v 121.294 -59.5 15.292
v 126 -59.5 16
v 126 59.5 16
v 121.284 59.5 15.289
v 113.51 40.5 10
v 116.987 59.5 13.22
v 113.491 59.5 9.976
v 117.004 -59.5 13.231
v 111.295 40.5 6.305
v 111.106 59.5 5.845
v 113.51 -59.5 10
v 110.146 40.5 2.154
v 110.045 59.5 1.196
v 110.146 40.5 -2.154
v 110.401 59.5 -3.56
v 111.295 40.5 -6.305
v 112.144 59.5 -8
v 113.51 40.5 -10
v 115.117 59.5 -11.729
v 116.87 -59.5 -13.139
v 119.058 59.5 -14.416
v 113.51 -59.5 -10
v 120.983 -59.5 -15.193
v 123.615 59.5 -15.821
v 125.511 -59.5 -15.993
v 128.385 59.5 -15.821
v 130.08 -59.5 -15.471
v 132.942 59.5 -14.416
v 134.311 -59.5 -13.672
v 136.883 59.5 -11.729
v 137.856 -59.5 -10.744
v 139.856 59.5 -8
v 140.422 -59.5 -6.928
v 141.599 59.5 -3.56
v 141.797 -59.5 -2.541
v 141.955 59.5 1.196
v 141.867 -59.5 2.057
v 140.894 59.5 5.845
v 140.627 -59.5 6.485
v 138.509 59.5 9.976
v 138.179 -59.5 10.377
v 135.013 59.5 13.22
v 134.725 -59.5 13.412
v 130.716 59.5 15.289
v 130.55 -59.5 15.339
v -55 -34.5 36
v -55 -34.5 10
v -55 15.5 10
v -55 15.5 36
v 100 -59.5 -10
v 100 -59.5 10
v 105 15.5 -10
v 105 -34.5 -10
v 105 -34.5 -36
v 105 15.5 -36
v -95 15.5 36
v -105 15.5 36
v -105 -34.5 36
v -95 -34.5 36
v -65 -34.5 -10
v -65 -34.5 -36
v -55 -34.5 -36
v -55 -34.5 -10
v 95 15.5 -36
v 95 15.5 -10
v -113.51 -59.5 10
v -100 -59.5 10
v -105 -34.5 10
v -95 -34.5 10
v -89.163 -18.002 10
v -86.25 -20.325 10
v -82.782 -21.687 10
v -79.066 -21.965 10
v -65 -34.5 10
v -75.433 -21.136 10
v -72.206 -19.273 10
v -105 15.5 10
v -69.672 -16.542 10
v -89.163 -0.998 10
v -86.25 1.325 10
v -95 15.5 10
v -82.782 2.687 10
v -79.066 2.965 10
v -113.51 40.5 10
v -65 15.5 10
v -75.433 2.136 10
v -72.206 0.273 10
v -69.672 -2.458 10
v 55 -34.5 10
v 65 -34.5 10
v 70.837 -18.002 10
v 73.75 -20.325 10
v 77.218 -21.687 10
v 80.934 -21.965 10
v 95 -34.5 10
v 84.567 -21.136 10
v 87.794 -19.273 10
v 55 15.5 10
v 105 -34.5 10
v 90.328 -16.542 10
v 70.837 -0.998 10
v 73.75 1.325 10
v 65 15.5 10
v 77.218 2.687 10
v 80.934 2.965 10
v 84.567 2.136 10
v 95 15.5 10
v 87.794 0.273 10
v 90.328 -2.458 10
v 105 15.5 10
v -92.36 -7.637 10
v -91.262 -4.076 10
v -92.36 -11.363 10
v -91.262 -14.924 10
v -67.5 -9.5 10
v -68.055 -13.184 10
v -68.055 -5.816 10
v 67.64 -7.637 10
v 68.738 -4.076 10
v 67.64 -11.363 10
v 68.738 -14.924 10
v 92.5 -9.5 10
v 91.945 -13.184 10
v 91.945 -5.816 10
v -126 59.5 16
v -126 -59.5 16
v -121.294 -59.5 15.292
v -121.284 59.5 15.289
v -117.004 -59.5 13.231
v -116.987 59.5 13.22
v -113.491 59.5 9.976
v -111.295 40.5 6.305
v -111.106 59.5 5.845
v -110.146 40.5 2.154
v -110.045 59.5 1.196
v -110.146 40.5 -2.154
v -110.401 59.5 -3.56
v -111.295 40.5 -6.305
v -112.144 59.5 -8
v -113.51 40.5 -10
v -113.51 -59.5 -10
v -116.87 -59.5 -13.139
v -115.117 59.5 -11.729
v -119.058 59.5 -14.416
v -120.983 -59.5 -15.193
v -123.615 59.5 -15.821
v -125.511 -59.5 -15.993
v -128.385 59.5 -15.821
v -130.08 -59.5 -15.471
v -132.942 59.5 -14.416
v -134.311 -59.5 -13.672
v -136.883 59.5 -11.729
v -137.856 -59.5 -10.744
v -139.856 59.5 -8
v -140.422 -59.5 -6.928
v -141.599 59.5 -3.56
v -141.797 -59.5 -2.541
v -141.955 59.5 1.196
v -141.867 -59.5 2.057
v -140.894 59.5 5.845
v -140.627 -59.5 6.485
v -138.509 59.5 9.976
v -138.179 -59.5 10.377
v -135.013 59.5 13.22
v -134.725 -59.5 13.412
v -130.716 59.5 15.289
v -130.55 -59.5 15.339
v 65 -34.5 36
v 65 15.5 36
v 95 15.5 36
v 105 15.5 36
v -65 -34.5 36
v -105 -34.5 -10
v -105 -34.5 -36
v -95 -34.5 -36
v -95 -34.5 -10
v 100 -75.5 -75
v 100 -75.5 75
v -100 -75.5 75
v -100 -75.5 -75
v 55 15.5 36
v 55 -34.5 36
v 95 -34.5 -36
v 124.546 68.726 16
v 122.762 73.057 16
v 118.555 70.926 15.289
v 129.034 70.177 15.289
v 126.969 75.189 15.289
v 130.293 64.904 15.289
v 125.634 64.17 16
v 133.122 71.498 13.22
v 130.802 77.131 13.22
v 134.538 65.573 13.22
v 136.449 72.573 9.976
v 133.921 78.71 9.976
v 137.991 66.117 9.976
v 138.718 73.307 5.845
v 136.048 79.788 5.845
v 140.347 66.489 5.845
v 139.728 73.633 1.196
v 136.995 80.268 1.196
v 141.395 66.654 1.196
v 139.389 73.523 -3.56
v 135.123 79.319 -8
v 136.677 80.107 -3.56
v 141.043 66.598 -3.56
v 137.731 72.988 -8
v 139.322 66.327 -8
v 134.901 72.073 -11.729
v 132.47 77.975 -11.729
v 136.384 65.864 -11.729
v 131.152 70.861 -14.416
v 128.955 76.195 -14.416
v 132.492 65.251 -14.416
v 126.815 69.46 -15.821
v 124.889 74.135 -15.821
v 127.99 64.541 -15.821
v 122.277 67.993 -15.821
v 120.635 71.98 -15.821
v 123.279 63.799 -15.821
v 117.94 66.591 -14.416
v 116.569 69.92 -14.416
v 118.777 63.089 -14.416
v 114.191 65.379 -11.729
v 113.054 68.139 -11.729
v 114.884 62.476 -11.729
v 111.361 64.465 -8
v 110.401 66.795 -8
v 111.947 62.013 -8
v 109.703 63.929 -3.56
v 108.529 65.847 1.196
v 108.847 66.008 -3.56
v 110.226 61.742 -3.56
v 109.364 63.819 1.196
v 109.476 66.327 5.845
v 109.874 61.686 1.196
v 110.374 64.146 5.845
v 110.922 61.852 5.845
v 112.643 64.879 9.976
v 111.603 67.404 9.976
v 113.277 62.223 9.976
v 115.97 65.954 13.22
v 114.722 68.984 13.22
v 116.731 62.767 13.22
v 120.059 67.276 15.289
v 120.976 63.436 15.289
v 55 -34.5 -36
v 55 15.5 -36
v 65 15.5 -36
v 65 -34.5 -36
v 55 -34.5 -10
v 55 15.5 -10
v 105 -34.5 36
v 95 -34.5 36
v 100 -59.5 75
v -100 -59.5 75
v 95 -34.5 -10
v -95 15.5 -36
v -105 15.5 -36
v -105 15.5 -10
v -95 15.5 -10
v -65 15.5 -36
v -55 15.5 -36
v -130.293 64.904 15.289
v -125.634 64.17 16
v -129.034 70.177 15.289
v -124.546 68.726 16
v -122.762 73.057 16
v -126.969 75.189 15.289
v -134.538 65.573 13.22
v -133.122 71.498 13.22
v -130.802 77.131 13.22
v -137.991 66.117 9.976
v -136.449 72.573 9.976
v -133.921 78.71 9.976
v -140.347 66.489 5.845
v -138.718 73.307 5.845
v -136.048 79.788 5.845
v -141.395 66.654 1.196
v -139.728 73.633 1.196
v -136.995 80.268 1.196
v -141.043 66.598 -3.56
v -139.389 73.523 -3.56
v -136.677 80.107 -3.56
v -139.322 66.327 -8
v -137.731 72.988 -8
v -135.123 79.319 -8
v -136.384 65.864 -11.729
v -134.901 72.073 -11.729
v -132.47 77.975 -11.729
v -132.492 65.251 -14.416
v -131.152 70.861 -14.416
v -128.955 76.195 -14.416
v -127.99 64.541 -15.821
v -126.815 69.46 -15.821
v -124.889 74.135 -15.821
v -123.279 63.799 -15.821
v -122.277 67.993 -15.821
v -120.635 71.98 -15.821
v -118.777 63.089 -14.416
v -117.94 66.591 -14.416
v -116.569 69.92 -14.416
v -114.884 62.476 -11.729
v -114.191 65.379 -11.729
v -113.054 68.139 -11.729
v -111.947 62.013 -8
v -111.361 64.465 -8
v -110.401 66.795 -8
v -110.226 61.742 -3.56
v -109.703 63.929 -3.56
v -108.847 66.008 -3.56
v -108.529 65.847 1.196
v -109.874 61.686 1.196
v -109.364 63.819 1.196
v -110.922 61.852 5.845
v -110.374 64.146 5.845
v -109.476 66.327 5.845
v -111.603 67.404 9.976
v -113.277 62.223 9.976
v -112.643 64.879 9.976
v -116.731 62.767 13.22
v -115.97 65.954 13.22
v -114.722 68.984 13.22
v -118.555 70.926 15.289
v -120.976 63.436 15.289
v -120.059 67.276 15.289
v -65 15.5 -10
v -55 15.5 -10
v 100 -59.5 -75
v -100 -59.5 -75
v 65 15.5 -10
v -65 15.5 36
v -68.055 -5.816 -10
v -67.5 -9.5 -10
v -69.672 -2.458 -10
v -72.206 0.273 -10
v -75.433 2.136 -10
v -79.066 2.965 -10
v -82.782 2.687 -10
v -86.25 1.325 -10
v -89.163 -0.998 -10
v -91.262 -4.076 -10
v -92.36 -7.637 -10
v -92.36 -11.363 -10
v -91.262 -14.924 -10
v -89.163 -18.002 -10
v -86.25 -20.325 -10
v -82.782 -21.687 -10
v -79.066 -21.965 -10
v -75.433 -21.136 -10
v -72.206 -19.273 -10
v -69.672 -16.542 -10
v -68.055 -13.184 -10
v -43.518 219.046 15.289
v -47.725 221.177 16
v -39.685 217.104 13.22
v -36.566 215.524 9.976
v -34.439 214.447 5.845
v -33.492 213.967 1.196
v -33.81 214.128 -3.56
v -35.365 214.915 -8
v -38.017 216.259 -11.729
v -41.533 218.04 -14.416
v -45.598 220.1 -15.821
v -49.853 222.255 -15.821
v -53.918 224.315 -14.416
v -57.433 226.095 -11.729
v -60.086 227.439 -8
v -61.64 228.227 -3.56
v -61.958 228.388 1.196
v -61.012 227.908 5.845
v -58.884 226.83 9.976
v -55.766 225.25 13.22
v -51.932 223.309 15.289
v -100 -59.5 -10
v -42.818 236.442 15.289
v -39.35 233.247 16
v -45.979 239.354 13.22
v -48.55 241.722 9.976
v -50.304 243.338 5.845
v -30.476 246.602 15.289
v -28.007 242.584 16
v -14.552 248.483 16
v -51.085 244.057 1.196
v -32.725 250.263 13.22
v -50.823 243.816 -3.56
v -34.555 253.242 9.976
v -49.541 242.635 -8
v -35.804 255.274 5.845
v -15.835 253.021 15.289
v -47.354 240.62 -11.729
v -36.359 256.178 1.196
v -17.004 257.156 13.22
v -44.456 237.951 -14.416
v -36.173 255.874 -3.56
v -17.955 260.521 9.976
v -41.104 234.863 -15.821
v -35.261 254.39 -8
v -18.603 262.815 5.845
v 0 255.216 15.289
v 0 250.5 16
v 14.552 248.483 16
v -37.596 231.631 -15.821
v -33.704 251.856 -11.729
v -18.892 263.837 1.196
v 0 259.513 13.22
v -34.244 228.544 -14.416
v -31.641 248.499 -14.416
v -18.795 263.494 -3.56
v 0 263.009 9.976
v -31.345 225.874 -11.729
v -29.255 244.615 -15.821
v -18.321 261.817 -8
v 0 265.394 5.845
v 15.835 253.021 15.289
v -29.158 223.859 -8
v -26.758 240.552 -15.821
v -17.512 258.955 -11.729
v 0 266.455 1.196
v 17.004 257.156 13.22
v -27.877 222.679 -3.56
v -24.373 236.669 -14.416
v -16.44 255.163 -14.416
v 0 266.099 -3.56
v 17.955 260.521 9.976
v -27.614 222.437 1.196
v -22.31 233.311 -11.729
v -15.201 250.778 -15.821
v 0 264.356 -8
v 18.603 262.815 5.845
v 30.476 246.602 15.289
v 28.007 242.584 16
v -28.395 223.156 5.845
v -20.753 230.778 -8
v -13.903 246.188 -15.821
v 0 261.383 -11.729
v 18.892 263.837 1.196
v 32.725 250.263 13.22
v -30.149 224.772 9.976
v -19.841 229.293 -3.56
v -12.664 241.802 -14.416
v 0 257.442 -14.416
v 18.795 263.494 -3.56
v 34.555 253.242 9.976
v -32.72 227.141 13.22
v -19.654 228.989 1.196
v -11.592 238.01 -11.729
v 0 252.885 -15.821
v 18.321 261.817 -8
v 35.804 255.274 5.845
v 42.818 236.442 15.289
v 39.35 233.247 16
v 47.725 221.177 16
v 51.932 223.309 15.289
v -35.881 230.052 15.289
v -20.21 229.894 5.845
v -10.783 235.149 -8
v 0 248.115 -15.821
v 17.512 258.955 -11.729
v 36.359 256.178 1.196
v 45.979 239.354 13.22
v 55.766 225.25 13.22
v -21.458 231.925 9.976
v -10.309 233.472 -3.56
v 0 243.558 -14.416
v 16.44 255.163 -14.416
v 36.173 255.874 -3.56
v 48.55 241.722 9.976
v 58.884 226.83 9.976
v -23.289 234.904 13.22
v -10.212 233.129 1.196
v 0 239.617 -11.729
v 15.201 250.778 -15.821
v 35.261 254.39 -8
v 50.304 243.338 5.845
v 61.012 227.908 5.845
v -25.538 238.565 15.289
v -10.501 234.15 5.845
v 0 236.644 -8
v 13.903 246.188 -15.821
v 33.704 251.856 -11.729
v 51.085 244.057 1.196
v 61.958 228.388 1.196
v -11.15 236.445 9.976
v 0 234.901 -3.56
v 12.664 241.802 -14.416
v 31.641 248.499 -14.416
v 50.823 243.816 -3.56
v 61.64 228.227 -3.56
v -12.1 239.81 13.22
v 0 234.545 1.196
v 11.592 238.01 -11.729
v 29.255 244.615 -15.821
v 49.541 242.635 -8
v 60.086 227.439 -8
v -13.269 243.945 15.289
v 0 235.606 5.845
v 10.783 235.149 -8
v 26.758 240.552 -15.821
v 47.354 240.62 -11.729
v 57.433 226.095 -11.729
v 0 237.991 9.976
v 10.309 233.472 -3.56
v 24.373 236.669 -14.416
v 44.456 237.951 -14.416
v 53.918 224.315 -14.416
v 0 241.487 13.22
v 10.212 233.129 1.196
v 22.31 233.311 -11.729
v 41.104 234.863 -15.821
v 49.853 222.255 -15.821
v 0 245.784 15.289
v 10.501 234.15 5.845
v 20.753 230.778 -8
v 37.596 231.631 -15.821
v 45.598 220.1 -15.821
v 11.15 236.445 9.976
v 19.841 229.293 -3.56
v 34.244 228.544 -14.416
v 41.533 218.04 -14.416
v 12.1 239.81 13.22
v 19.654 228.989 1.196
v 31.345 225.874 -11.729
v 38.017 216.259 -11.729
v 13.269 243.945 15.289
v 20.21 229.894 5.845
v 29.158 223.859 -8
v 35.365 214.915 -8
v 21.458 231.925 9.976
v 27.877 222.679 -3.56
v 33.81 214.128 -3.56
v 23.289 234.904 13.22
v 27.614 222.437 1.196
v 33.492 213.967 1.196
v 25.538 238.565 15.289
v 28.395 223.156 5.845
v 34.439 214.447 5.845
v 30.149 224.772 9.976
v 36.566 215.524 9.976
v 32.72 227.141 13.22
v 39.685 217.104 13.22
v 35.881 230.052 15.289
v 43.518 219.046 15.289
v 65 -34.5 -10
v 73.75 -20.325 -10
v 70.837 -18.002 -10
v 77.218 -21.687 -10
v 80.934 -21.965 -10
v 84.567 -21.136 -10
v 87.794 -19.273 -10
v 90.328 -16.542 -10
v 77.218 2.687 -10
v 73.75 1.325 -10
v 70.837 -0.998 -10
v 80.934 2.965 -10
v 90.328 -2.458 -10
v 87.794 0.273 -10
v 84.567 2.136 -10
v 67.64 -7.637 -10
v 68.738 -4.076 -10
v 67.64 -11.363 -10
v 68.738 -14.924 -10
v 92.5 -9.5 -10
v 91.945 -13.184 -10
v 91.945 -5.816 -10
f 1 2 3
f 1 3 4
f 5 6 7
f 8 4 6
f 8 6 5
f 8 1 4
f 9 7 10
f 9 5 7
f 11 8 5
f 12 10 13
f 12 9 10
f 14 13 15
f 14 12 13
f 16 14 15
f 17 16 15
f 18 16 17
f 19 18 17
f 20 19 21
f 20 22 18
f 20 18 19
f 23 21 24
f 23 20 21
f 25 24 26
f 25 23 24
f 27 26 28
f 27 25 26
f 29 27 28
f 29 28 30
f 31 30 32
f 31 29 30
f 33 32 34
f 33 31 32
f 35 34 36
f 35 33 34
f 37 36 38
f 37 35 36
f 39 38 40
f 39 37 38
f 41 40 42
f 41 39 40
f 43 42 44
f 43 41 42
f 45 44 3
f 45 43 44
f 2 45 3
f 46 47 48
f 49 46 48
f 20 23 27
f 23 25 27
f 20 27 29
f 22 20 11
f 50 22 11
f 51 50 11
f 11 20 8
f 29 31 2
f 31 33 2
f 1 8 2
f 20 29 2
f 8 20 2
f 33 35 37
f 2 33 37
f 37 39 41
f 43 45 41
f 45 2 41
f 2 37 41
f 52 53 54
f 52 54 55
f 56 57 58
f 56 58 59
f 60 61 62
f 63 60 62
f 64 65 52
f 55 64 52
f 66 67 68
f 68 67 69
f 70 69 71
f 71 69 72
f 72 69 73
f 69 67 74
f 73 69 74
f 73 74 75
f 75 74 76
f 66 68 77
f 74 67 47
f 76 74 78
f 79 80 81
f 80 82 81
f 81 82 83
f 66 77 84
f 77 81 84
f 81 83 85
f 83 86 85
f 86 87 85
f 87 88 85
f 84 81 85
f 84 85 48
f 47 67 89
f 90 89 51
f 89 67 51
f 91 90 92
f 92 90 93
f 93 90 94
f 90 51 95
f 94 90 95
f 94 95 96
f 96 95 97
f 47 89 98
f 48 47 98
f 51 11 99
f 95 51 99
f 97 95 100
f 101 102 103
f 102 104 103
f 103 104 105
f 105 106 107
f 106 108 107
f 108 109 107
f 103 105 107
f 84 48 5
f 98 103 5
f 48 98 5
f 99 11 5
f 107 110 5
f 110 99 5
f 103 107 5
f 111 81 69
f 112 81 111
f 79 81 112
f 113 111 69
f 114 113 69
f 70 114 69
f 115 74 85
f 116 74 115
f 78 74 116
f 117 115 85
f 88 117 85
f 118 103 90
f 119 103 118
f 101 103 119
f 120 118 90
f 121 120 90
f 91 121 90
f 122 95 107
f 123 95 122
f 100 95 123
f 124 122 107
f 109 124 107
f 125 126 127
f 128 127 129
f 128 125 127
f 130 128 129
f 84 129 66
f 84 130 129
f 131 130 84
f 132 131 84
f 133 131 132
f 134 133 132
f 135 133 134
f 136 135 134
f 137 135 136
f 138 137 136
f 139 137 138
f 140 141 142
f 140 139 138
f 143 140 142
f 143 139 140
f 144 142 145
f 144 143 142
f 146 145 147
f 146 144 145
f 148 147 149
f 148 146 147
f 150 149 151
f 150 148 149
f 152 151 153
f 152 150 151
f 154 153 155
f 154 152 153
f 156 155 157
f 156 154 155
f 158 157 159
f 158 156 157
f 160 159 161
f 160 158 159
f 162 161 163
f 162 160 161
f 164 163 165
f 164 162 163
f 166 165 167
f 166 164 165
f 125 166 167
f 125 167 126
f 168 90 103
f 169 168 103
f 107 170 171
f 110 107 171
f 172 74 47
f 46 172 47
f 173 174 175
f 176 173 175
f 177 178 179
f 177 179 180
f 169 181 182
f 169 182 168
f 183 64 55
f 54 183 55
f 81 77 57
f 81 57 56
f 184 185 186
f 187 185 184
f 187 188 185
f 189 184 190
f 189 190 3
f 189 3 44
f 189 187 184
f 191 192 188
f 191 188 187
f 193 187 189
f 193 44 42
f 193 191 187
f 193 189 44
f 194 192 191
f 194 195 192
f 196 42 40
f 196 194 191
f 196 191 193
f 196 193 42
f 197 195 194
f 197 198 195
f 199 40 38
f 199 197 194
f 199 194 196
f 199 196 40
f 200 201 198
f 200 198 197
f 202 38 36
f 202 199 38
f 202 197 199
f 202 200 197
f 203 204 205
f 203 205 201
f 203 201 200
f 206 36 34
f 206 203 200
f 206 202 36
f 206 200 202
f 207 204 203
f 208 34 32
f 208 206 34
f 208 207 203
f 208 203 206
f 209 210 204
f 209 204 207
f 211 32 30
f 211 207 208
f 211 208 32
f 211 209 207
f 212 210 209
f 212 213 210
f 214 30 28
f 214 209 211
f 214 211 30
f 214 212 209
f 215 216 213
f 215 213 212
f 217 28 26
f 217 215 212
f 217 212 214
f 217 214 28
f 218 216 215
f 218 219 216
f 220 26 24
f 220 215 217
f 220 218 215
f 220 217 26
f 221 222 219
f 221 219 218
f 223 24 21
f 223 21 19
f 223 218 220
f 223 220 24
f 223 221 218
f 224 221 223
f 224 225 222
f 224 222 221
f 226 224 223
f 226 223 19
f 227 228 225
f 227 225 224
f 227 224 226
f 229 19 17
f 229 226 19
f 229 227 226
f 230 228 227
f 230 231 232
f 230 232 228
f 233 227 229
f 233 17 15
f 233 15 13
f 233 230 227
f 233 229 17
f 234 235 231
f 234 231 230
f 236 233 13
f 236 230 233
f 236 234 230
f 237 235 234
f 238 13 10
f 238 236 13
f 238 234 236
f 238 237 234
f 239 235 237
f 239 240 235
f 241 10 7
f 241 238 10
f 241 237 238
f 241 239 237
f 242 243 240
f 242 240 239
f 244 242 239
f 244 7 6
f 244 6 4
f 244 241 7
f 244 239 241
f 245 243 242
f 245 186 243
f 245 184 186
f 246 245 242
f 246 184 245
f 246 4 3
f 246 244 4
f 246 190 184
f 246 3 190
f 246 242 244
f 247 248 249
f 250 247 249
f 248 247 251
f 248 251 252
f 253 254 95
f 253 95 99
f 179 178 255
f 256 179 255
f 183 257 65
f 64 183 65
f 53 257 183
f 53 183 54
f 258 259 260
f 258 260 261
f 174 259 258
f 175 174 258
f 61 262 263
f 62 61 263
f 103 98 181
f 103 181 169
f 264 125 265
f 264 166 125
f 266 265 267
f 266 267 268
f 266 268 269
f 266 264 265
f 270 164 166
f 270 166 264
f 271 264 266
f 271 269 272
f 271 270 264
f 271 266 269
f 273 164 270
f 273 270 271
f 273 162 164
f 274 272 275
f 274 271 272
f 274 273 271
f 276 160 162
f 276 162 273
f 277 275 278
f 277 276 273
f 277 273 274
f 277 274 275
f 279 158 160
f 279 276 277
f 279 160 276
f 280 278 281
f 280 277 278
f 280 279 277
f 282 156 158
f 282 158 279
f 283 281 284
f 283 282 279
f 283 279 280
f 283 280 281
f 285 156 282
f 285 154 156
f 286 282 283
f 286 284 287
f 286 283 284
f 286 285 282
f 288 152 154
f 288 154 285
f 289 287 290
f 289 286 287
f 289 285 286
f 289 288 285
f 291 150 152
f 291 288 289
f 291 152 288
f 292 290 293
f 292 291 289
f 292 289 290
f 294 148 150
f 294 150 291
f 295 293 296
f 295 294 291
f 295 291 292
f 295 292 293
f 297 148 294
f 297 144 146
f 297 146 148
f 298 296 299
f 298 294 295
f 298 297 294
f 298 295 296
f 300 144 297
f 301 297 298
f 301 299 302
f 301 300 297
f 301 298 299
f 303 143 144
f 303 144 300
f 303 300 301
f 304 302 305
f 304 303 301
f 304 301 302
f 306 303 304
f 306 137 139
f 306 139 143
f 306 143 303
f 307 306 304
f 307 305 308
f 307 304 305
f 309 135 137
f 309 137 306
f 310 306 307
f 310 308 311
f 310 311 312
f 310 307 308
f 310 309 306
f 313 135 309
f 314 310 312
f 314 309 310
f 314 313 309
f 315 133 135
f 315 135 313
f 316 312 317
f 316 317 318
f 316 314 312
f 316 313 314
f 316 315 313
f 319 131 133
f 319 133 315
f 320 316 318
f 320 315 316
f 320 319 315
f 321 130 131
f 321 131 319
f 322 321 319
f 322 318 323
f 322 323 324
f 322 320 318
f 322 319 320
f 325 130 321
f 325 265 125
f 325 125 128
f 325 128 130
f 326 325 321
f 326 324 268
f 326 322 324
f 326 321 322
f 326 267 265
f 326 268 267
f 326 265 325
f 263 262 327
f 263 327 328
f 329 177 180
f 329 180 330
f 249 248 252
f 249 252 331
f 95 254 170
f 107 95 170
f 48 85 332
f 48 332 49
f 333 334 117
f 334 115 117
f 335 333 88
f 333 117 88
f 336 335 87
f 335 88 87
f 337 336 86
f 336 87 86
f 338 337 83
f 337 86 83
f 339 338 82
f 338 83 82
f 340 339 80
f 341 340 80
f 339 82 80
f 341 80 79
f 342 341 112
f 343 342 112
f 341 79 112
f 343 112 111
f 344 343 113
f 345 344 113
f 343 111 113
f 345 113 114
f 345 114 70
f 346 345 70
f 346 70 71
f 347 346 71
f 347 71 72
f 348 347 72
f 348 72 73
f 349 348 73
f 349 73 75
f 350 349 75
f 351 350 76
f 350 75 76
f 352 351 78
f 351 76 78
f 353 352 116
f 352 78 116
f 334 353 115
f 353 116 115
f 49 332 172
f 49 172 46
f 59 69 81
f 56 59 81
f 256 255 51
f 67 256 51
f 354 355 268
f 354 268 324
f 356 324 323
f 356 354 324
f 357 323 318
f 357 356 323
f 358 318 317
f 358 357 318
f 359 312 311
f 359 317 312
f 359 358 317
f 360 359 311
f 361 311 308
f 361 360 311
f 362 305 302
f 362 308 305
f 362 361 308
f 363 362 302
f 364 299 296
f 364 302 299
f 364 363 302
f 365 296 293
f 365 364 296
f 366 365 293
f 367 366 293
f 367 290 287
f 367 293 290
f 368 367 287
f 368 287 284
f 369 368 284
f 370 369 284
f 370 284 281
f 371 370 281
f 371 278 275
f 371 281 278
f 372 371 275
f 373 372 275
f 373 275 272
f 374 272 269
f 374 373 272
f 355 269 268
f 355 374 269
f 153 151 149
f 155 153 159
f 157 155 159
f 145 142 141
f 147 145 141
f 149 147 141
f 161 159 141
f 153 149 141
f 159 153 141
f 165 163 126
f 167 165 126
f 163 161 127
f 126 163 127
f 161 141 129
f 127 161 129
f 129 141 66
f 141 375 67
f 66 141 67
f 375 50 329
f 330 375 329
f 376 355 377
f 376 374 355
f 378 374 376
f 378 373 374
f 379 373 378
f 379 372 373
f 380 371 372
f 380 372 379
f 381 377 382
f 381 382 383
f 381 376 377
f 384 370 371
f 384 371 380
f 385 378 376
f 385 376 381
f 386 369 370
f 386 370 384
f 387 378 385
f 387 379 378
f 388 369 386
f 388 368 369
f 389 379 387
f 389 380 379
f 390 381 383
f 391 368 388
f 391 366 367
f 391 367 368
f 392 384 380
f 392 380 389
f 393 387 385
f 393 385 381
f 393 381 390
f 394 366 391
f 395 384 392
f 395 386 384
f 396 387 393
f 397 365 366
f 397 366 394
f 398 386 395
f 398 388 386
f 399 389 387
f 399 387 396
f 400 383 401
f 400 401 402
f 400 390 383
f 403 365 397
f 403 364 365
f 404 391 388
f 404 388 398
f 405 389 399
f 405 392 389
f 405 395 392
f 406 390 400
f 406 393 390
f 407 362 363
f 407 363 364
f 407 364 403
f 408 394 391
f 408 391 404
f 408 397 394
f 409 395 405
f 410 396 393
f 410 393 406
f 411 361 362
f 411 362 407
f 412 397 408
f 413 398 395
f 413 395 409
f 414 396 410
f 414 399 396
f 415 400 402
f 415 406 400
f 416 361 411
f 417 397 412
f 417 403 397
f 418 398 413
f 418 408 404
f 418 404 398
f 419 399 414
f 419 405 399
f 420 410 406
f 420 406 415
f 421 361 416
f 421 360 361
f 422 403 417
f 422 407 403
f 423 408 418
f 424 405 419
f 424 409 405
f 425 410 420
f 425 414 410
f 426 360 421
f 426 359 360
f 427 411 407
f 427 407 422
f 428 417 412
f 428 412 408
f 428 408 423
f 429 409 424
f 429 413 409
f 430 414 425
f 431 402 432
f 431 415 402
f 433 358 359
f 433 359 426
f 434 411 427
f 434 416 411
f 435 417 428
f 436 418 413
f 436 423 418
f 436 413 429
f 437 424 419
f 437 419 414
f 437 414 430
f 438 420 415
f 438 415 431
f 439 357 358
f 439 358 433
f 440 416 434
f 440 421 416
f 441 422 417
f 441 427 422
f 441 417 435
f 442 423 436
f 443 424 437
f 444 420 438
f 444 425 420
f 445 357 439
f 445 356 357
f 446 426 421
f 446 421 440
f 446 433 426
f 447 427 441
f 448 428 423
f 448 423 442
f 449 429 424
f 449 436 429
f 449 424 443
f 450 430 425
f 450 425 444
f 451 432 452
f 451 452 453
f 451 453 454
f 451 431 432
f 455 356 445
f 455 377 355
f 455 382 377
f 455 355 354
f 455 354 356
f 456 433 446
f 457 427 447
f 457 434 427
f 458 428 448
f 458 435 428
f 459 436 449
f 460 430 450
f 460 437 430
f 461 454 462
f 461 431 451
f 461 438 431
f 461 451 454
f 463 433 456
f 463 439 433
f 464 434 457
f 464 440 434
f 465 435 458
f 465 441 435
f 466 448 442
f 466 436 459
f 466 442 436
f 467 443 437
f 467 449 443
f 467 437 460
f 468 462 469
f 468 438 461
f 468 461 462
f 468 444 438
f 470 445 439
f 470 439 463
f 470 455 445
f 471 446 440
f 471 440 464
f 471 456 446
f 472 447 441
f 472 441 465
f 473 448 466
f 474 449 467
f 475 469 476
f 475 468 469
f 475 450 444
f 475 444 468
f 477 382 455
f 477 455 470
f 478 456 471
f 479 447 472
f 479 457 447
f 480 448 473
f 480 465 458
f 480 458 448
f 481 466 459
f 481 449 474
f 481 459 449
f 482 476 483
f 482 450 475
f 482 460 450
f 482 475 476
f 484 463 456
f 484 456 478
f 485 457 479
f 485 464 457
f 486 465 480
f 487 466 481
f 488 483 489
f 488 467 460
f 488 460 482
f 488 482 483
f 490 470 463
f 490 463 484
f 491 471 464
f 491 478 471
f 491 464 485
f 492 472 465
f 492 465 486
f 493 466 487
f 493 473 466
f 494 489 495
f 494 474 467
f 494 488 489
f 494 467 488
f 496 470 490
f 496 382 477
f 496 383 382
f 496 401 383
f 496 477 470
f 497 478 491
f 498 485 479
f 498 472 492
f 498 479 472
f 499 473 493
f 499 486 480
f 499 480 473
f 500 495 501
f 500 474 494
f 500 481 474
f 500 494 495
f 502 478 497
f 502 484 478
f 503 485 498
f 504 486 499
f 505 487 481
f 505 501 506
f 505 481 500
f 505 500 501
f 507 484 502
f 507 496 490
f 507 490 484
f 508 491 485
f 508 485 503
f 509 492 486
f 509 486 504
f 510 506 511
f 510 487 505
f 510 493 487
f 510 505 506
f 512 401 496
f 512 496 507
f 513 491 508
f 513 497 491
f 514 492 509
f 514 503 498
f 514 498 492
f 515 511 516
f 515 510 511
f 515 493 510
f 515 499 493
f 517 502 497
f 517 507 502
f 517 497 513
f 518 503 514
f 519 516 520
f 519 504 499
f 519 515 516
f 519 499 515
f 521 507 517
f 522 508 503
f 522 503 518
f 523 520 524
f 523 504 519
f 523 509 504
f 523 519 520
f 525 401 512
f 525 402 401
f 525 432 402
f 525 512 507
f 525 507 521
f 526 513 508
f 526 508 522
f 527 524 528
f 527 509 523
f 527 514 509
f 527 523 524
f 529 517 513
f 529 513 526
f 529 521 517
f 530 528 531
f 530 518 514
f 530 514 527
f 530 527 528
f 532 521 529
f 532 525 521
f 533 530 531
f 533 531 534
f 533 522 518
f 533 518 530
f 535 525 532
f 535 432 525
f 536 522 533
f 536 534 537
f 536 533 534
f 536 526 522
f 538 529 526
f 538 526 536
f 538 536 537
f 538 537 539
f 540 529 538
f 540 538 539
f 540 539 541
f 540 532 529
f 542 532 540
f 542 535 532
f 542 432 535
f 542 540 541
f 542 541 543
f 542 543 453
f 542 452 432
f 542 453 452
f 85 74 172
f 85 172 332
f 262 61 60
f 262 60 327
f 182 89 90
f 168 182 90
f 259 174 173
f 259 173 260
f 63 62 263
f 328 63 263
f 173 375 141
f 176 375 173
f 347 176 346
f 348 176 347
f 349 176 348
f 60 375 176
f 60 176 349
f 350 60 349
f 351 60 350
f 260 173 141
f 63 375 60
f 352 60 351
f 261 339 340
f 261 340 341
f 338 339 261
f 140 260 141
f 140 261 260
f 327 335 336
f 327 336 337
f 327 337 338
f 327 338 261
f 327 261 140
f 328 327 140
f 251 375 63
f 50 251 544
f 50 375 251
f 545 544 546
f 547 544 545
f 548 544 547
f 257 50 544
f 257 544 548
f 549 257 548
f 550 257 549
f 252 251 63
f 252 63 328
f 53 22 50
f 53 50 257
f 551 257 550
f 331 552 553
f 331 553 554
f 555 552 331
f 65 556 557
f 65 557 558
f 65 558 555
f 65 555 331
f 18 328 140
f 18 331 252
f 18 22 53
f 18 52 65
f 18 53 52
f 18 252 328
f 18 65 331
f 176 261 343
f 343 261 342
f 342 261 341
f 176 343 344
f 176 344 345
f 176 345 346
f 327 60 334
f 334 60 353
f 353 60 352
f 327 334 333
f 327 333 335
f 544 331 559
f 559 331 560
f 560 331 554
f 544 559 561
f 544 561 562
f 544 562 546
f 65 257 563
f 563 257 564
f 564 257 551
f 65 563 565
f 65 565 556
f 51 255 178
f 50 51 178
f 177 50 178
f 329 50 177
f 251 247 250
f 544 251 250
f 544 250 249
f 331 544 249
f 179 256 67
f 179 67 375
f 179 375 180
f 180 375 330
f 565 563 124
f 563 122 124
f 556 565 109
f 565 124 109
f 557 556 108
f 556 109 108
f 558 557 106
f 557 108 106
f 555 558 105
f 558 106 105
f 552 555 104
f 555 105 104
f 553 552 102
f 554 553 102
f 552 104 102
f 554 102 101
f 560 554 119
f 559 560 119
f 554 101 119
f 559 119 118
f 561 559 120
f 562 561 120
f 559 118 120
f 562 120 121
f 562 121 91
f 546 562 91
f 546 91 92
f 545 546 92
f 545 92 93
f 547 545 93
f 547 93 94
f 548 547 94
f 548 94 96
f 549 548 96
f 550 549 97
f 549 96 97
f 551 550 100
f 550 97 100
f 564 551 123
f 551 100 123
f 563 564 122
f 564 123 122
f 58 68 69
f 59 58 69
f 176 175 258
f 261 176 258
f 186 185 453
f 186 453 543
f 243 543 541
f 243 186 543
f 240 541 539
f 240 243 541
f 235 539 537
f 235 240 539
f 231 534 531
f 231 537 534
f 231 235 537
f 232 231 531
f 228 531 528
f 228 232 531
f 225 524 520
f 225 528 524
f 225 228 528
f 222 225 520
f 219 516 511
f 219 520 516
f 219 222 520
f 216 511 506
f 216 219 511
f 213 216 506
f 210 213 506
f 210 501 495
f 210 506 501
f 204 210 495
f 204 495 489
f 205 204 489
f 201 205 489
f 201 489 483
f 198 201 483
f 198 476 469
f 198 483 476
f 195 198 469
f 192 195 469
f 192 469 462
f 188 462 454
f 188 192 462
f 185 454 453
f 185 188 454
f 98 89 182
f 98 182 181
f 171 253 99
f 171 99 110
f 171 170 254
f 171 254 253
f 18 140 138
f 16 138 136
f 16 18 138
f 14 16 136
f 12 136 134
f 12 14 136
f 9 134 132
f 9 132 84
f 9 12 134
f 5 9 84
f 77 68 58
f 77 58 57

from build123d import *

# Parameters (mm, degrees)
SWEEP1_PROFILE_R        = 16
SKETCH8_W               = 220
SKETCH8_H               = 100
BOSS_EXTRUDE1_DEPTH     = 10
BOSS_EXTRUDE3_START     = -223.510004
SKETCH12_W              = 20
SKETCH12_H              = 100
BOSS_EXTRUDE3_DEPTH     = 227.020008
SKETCH10_R              = 12.5
CUT_EXTRUDE1_DEPTH      = 17.0000001
CUT_EXTRUDE1_DEPTH_BACK = 17.0000001
SKETCH11_W              = 10
SKETCH11_H              = 50
BOSS_EXTRUDE2_DEPTH     = 36
SKETCH15_W              = 150
SKETCH15_H              = 16
BOSS_EXTRUDE4_DEPTH     = 100


with BuildPart() as part:
    # Sweep1: sweep along a path in Sketch1
    with BuildLine(Plane.XY) as sweep1_path:
        Line((-126, -59.5), (-126, 40.5))
        Line((-126, 40.5), (-126, 59.5))
        ThreePointArc((-126, 59.5), (-125.179239367, 66.4693608), (-122.761867336, 73.057376467))
        Line((-122.761867336, 73.057376467), (-47.725330083, 221.177321367))
        ThreePointArc((-47.725330083, 221.177321367), (0, 250.5), (47.725330083, 221.177321367))
        Line((47.725330083, 221.177321367), (122.761867336, 73.057376467))
        ThreePointArc((122.761867336, 73.057376467), (125.179239367, 66.4693608), (126, 59.5))
        Line((126, 59.5), (126, 40.5))
        Line((126, 40.5), (126, -59.5))
    # Sweep1 profile (on start of the path) → Sweep1 (sweep)
    with BuildSketch(Plane(origin=(-126, -59.5, 0), x_dir=(0, 0, 1), z_dir=(0, 1, 0))):
        Circle(SWEEP1_PROFILE_R)
    sweep(path=sweep1_path.line)



with BuildPart() as body_2:
    # Sketch8 → Boss-Extrude1 (new body, symmetric)
    with BuildSketch(Plane.XY):
        with Locations((0, -9.5)):
            Rectangle(SKETCH8_W, SKETCH8_H)
    extrude(amount=BOSS_EXTRUDE1_DEPTH, both=True)


with BuildPart() as part_1:
    add(part.part)

    add(body_2.part)  # Boss-Extrude3 merges body 2
    # Sketch12 → Boss-Extrude3 (add)
    with BuildSketch(Plane.ZY.offset(110).offset(BOSS_EXTRUDE3_START)):
        with Locations((0, -9.5)):
            Rectangle(SKETCH12_W, SKETCH12_H)
    extrude(amount=BOSS_EXTRUDE3_DEPTH)

    # Sketch10 → Cut-Extrude1 (cut, two sides)
    with BuildSketch(Plane.XY) as cut_extrude1_sk:
        with Locations((80, -9.5)):
            Circle(SKETCH10_R)
        with Locations((-80, -9.5)):
            Circle(SKETCH10_R)
    extrude(amount=CUT_EXTRUDE1_DEPTH, mode=Mode.SUBTRACT)
    extrude(cut_extrude1_sk.sketch, amount=-CUT_EXTRUDE1_DEPTH_BACK, mode=Mode.SUBTRACT)

    # Sketch11 → Boss-Extrude2 (add, symmetric)
    with BuildSketch(Plane.XY):
        with Locations((-100, -9.5)):
            Rectangle(SKETCH11_W, SKETCH11_H)
        with Locations((-60, -9.5)):
            Rectangle(SKETCH11_W, SKETCH11_H)
        with Locations((60, -9.5)):
            Rectangle(SKETCH11_W, SKETCH11_H)
        with Locations((100, -9.5)):
            Rectangle(SKETCH11_W, SKETCH11_H)
    extrude(amount=BOSS_EXTRUDE2_DEPTH, both=True)

    # Sketch15 → Boss-Extrude4 (add, symmetric)
    with BuildSketch(Plane(origin=(0, 0, 0), x_dir=(0, 0, -1), z_dir=(1, 0, 0))):
        with Locations((0, -67.5)):
            Rectangle(SKETCH15_W, SKETCH15_H)
    extrude(amount=BOSS_EXTRUDE4_DEPTH, both=True)


solid = part_1.part
